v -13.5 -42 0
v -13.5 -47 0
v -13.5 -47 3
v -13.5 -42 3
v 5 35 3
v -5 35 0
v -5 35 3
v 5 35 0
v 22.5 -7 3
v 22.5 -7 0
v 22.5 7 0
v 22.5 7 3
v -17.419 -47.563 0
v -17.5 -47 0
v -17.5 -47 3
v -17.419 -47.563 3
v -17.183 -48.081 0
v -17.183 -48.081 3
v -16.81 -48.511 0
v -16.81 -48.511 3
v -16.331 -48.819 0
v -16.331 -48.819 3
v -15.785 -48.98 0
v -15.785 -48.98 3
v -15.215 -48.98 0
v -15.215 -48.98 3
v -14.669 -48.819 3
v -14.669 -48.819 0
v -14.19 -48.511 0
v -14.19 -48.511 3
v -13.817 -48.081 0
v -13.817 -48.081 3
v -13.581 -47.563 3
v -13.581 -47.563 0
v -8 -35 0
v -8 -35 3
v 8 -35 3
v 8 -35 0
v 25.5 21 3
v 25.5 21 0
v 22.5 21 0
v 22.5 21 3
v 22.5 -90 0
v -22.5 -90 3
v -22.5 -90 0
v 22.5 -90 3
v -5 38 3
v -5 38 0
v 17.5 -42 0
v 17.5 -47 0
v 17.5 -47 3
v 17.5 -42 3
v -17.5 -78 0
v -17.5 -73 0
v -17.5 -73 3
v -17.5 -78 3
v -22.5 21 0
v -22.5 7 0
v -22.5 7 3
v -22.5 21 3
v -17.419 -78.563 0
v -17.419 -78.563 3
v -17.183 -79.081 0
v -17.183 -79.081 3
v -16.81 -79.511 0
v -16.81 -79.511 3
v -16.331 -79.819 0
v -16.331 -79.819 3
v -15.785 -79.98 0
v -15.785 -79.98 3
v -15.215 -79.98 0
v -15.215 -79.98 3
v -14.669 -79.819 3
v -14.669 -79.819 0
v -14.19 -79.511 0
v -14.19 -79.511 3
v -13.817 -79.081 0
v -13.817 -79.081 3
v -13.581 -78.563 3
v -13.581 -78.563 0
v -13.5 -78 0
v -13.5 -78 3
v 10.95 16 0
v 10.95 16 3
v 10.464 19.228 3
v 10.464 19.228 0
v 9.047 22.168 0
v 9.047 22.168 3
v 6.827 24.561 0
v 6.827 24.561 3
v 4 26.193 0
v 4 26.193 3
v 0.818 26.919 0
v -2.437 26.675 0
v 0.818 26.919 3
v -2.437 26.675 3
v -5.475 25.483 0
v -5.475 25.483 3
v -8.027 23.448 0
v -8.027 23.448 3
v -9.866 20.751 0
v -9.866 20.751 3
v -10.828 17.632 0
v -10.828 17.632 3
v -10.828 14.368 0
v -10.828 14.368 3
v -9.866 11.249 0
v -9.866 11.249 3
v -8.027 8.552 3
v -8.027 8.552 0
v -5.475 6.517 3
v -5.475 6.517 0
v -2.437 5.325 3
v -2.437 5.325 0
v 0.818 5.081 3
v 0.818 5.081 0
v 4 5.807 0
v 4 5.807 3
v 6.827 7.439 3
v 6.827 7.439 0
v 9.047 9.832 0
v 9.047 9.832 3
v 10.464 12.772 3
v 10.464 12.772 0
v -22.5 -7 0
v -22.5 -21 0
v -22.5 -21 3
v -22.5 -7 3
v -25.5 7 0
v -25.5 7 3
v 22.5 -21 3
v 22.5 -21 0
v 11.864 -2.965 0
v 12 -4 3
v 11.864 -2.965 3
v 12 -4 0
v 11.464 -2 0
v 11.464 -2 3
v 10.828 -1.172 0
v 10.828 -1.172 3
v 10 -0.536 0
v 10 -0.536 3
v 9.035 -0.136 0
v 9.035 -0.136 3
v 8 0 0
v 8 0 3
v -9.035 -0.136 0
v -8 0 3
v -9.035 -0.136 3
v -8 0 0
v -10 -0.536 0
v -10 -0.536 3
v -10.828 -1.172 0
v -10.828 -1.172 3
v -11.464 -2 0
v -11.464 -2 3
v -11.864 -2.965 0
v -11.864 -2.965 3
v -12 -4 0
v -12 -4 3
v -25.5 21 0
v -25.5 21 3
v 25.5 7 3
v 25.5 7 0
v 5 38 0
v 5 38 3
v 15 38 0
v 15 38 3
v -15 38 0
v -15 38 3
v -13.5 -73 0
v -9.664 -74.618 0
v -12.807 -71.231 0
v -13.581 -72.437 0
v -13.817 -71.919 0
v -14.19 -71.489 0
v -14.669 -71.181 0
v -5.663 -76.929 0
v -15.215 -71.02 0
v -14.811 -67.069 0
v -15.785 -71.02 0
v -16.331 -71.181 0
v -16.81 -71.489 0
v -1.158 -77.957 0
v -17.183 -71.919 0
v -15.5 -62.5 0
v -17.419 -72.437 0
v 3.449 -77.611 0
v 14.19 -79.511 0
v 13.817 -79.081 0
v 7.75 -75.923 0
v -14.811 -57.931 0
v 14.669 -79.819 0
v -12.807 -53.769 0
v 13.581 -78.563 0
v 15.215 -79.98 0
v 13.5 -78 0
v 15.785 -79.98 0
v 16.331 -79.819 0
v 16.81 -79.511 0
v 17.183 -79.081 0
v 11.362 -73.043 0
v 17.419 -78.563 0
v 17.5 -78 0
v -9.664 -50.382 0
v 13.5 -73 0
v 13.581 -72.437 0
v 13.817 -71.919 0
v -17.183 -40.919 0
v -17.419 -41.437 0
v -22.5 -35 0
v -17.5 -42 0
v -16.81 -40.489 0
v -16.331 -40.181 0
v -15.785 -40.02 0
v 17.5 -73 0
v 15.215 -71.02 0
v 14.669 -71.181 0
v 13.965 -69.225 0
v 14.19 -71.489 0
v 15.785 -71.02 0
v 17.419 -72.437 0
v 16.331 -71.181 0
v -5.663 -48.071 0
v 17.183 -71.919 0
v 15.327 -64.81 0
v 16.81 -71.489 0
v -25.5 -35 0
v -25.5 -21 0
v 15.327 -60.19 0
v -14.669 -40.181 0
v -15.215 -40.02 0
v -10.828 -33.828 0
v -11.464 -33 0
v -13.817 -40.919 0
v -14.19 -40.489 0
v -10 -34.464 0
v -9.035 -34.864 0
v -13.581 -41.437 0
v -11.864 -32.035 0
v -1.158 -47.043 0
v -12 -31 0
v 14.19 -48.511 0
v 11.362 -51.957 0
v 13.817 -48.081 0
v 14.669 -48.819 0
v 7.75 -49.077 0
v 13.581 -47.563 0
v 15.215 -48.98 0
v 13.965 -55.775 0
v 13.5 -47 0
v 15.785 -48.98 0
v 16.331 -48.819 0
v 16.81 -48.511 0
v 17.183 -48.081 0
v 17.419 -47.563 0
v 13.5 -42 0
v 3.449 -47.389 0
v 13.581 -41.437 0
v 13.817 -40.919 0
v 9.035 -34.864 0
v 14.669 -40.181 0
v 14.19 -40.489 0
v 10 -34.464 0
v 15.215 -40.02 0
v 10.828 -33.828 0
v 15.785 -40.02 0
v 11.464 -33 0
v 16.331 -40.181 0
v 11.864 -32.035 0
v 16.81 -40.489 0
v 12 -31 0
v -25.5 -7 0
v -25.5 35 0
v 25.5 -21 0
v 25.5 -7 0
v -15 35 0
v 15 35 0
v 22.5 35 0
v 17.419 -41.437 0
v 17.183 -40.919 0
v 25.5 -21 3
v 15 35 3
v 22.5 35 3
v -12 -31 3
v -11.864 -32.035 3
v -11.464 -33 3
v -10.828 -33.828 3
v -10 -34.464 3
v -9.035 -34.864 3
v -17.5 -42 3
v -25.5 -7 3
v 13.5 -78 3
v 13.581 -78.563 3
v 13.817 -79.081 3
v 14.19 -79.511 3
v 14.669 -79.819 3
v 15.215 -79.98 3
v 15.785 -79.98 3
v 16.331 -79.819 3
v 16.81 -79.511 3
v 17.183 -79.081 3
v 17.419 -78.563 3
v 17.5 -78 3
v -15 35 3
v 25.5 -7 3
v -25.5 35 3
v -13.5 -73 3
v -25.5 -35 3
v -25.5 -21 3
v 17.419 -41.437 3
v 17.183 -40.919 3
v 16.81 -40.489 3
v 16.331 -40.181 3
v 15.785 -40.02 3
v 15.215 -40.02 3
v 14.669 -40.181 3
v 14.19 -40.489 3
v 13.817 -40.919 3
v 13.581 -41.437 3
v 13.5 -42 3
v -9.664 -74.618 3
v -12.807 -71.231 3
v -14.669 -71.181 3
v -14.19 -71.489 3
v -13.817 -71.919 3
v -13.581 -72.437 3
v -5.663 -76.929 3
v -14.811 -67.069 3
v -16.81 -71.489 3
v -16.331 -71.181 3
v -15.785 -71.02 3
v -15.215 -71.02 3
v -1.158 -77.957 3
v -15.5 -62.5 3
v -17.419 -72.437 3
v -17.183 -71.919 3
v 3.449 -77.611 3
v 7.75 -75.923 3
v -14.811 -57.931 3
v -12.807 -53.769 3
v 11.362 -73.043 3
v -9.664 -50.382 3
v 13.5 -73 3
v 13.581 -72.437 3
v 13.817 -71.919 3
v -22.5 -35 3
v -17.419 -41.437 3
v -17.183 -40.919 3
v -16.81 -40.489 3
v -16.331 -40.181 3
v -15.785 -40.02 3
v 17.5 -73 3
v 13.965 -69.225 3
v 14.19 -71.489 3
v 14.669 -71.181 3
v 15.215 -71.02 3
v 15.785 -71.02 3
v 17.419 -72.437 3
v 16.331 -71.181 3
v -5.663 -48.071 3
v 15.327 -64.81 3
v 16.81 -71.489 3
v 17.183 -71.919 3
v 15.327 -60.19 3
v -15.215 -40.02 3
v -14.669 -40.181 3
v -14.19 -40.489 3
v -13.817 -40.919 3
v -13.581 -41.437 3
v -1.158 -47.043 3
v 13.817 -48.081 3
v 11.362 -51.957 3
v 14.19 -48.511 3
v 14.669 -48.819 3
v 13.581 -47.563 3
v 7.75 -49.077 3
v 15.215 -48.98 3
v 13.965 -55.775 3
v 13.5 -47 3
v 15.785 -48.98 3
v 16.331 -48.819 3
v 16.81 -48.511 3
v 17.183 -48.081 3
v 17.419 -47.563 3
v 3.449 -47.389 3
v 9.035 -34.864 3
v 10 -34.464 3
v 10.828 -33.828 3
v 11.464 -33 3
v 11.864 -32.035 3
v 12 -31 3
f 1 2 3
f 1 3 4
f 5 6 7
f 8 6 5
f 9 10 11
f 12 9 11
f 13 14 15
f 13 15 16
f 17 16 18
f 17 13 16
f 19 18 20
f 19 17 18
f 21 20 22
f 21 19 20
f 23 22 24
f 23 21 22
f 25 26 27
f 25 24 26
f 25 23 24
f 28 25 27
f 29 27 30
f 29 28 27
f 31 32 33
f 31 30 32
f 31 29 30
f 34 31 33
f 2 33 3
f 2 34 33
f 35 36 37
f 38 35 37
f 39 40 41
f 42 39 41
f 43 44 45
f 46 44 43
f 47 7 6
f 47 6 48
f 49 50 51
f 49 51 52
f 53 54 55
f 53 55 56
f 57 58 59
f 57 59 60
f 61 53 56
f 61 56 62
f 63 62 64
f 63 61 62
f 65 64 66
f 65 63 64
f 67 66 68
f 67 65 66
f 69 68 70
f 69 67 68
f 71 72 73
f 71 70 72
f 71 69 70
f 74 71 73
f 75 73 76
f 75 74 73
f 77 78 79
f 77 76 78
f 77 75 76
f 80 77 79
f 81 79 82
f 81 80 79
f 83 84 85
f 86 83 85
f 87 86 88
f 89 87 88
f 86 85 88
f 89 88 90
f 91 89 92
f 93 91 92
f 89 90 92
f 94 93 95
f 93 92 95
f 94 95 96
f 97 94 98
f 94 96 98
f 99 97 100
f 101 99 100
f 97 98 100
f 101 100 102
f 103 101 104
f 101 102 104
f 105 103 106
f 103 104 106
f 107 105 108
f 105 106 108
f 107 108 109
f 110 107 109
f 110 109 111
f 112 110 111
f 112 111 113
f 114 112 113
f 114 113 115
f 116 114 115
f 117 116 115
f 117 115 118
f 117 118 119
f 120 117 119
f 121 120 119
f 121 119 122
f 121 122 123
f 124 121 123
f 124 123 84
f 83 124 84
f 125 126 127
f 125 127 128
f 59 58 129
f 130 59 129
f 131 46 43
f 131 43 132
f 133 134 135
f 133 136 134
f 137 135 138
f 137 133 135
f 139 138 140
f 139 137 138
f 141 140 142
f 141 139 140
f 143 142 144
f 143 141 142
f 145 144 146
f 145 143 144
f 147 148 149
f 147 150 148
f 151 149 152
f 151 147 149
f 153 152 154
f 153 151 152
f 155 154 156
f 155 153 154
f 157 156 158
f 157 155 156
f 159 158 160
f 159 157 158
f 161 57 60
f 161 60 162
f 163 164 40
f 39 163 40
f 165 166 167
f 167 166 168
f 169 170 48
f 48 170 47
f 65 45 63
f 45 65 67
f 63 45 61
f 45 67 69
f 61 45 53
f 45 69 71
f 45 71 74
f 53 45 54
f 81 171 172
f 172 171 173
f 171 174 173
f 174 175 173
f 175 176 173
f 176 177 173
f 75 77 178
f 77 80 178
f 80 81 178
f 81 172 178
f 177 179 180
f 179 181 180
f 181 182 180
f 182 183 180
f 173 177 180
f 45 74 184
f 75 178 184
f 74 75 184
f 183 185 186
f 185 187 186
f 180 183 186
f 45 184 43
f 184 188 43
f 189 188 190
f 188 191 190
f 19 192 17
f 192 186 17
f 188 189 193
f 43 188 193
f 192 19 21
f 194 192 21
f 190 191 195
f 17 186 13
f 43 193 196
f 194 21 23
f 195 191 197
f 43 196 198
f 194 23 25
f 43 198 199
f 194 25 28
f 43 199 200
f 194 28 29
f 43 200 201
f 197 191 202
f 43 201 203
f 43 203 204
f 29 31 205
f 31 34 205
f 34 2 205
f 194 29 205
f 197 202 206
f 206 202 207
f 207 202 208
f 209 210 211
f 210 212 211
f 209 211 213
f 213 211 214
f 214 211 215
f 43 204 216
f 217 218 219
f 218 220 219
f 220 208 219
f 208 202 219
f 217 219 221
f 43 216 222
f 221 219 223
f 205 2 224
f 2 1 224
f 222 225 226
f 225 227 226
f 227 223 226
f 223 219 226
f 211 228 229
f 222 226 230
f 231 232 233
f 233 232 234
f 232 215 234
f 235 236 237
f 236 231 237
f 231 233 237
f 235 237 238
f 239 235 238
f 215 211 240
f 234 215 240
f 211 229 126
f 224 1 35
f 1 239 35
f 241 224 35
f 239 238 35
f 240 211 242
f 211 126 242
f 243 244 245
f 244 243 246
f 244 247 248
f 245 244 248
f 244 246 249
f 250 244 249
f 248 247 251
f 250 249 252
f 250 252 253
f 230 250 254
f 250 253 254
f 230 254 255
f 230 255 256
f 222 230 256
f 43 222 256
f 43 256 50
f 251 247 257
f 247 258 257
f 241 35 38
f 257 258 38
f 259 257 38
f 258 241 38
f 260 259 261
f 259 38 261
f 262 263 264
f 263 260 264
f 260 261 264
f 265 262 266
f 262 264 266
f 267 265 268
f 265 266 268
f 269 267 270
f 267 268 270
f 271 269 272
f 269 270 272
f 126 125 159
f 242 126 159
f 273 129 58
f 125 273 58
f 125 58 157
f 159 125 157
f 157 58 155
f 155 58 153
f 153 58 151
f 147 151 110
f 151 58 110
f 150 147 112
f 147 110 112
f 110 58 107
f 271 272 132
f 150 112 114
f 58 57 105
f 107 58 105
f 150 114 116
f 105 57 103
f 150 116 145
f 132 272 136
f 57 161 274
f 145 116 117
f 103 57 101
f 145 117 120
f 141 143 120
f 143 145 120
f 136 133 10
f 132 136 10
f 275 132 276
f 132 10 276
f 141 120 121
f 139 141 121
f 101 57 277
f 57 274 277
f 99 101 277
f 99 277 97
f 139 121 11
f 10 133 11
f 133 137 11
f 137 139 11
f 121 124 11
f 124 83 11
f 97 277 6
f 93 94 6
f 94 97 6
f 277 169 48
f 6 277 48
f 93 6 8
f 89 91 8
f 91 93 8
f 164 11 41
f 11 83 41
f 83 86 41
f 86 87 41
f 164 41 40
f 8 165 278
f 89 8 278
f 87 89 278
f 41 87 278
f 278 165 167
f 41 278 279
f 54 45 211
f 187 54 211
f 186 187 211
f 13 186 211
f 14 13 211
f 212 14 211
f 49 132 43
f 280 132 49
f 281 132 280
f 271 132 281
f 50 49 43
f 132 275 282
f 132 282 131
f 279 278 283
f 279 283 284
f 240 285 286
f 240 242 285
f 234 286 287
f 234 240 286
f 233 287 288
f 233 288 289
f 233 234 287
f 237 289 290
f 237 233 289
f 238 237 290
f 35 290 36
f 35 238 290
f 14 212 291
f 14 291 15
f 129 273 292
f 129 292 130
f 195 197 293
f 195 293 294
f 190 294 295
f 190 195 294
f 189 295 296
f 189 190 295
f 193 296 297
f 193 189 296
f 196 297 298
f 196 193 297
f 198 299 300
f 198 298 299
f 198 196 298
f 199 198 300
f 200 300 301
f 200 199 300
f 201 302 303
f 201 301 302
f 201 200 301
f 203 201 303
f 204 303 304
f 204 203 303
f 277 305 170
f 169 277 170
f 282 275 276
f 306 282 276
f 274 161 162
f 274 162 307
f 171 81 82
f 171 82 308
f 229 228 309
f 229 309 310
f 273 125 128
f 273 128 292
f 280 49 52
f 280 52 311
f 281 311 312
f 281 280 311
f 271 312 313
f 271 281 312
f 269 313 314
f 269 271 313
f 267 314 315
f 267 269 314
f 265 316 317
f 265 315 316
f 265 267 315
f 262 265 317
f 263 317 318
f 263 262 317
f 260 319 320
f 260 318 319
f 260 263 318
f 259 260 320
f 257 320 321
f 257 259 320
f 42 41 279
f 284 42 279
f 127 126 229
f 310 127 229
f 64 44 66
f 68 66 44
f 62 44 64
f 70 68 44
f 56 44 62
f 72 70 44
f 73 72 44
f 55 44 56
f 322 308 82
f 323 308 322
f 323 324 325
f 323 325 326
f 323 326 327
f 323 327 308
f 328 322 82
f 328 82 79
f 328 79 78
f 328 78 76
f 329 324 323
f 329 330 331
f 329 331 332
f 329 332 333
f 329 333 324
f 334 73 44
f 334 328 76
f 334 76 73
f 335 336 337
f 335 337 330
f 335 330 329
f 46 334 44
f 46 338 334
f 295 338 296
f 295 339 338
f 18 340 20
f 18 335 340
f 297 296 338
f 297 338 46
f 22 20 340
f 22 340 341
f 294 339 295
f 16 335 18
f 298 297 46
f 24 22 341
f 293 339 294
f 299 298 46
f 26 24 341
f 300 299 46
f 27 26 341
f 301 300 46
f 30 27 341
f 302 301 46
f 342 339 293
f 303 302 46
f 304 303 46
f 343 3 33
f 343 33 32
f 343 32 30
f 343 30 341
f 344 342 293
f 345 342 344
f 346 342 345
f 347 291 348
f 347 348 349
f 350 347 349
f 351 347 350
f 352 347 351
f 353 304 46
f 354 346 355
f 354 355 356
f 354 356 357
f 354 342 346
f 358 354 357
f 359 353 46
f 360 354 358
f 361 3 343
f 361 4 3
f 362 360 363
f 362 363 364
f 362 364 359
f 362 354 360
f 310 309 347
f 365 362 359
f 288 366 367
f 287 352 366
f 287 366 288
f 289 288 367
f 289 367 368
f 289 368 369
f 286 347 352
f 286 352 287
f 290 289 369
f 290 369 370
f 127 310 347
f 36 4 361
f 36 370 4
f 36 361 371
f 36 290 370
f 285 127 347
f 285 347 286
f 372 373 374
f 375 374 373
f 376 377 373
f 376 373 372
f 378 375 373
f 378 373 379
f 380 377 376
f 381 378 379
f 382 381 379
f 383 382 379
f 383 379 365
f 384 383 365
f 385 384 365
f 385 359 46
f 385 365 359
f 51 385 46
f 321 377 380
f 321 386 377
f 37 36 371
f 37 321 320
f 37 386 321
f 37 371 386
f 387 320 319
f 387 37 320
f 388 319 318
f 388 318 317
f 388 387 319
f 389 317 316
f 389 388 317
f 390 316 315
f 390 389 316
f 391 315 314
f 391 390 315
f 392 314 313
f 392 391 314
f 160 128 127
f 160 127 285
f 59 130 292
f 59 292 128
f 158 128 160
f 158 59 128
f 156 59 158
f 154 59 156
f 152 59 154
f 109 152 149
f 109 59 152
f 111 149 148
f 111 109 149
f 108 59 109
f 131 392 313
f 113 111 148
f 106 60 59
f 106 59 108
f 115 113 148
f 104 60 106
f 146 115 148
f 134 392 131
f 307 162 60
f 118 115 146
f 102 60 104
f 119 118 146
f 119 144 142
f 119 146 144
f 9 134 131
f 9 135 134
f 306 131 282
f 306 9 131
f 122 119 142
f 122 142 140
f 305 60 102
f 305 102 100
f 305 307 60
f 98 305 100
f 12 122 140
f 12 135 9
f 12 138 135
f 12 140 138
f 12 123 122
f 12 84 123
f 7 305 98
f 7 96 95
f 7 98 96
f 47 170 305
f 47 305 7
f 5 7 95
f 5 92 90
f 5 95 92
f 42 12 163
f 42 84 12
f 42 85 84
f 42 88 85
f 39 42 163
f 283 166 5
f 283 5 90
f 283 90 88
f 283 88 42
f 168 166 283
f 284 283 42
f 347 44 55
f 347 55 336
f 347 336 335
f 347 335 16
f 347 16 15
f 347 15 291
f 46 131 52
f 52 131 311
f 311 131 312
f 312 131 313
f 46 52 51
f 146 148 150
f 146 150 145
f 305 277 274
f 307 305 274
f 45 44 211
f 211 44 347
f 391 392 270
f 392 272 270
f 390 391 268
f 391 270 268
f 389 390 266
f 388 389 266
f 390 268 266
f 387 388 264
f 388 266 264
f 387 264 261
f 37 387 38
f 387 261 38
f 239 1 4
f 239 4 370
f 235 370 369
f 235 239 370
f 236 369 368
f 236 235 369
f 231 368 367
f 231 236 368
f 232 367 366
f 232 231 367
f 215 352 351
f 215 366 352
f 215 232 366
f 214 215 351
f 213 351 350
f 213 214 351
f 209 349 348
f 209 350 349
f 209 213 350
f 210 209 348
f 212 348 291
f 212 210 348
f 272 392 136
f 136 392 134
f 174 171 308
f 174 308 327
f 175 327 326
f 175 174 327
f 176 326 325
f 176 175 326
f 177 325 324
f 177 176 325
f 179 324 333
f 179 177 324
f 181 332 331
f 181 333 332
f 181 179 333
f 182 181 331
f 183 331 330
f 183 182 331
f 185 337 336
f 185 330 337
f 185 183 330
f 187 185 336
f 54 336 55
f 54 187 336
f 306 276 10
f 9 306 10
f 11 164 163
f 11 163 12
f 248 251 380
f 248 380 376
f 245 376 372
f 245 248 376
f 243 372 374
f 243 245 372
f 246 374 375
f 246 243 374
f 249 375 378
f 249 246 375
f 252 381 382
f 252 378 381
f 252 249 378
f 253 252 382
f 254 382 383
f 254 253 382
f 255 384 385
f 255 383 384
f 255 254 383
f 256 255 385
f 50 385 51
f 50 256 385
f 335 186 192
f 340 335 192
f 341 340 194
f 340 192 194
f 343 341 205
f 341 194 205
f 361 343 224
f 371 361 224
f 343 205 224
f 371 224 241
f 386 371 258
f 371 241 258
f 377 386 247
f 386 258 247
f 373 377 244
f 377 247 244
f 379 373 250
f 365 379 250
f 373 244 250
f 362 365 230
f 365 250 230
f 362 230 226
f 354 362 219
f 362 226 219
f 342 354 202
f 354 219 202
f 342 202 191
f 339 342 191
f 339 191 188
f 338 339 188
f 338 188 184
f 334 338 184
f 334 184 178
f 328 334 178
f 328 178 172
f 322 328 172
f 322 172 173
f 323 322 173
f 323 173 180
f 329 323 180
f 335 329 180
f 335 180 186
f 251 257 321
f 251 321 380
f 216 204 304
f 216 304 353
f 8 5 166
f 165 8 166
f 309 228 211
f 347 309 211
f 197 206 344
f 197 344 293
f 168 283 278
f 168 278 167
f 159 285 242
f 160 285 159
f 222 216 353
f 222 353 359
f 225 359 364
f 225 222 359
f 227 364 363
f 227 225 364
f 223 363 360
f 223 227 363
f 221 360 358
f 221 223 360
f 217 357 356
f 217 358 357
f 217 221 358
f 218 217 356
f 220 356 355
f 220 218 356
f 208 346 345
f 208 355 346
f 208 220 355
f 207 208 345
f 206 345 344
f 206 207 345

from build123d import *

# Parameters (mm, degrees)
SKETCH1_W           = 45
SKETCH1_H           = 70
BOSS_EXTRUDE1_DEPTH = 3
SKETCH2_R           = 10.95
SKETCH2_W           = 24
SKETCH2_H           = 35
CUT_EXTRUDE1_DEPTH  = 4
SKETCH4_W           = 10
SKETCH4_H           = 3
BOSS_EXTRUDE3_DEPTH = 3
SKETCH3_W           = 3
SKETCH3_H           = 14
BOSS_EXTRUDE2_DEPTH = 3
SKETCH5_W           = 45
SKETCH5_H           = 55
BOSS_EXTRUDE4_DEPTH = 3
FILLET1_R           = 4
SKETCH6_R           = 15.5
CUT_EXTRUDE2_DEPTH  = 10


with BuildPart() as part:
    # Sketch1 → Boss-Extrude1 (new body)
    with BuildSketch(Plane.XY):
        Rectangle(SKETCH1_W, SKETCH1_H)
    extrude(amount=BOSS_EXTRUDE1_DEPTH)

    # Sketch2 → Cut-Extrude1 (cut, through all)
    with BuildSketch(Plane.XY.offset(3)):
        with Locations((0, 16)):
            Circle(SKETCH2_R)
        with Locations((0, -17.5)):
            Rectangle(SKETCH2_W, SKETCH2_H)
    extrude(amount=-CUT_EXTRUDE1_DEPTH, mode=Mode.SUBTRACT)

    # Sketch4 → Boss-Extrude3 (add)
    with BuildSketch(Plane.XY.offset(3)):
        with Locations((-10, 36.5)):
            Rectangle(SKETCH4_W, SKETCH4_H)
        with Locations((10, 36.5)):
            Rectangle(SKETCH4_W, SKETCH4_H)
    extrude(amount=-BOSS_EXTRUDE3_DEPTH)

    # Sketch3 → Boss-Extrude2 (add)
    with BuildSketch(Plane(origin=(0, 0, 0), x_dir=(-1, 0, 0), z_dir=(0, 0, -1))):
        with Locations((24, 0)):
            Rectangle(SKETCH3_W, SKETCH3_H)
        with Locations((24, 28)):
            Rectangle(SKETCH3_W, SKETCH3_H)
        with Locations((24, -28)):
            Rectangle(SKETCH3_W, SKETCH3_H)
        with Locations((-24, 14)):
            Rectangle(SKETCH3_W, SKETCH3_H)
        with Locations((-24, -14)):
            Rectangle(SKETCH3_W, SKETCH3_H)
    extrude(amount=-BOSS_EXTRUDE2_DEPTH)

    # Sketch5 → Boss-Extrude4 (add)
    with BuildSketch(Plane.XY.offset(3)):
        with Locations((0, -62.5)):
            Rectangle(SKETCH5_W, SKETCH5_H)
    extrude(amount=-BOSS_EXTRUDE4_DEPTH)

    # Fillet1
    fillet1_edges = [part.edges().sort_by_distance(p)[0] for p in [
        (12, 0, 1.5),
        (12, -35, 1.5),
        (-12, -35, 1.5),
        (-12, 0, 1.5),
    ]]
    fillet(fillet1_edges, radius=FILLET1_R)

    # Sketch6 → Cut-Extrude2 (cut)
    with BuildSketch(Plane(origin=(0, 0, 0), x_dir=(-1, 0, 0), z_dir=(0, 0, -1))):
        with Locations((0, -62.5)):
            Circle(SKETCH6_R)
        with BuildLine():
            Line((13.5, -78), (13.5, -73))
            ThreePointArc((13.5, -73), (15.5, -71), (17.5, -73))
            Line((17.5, -73), (17.5, -78))
            ThreePointArc((17.5, -78), (15.5, -80), (13.5, -78))
        make_face()
        with BuildLine():
            Line((-17.5, -78), (-17.5, -73))
            ThreePointArc((-17.5, -73), (-15.5, -71), (-13.5, -73))
            Line((-13.5, -73), (-13.5, -78))
            ThreePointArc((-13.5, -78), (-15.5, -80), (-17.5, -78))
        make_face()
        with BuildLine():
            Line((-17.5, -47), (-17.5, -42))
            ThreePointArc((-17.5, -42), (-15.5, -40), (-13.5, -42))
            Line((-13.5, -42), (-13.5, -47))
            ThreePointArc((-13.5, -47), (-15.5, -49), (-17.5, -47))
        make_face()
        with BuildLine():
            Line((13.5, -47), (13.5, -42))
            ThreePointArc((13.5, -42), (15.5, -40), (17.5, -42))
            Line((17.5, -42), (17.5, -47))
            ThreePointArc((17.5, -47), (15.5, -49), (13.5, -47))
        make_face()
    extrude(amount=-CUT_EXTRUDE2_DEPTH, mode=Mode.SUBTRACT)


solid = part.part
